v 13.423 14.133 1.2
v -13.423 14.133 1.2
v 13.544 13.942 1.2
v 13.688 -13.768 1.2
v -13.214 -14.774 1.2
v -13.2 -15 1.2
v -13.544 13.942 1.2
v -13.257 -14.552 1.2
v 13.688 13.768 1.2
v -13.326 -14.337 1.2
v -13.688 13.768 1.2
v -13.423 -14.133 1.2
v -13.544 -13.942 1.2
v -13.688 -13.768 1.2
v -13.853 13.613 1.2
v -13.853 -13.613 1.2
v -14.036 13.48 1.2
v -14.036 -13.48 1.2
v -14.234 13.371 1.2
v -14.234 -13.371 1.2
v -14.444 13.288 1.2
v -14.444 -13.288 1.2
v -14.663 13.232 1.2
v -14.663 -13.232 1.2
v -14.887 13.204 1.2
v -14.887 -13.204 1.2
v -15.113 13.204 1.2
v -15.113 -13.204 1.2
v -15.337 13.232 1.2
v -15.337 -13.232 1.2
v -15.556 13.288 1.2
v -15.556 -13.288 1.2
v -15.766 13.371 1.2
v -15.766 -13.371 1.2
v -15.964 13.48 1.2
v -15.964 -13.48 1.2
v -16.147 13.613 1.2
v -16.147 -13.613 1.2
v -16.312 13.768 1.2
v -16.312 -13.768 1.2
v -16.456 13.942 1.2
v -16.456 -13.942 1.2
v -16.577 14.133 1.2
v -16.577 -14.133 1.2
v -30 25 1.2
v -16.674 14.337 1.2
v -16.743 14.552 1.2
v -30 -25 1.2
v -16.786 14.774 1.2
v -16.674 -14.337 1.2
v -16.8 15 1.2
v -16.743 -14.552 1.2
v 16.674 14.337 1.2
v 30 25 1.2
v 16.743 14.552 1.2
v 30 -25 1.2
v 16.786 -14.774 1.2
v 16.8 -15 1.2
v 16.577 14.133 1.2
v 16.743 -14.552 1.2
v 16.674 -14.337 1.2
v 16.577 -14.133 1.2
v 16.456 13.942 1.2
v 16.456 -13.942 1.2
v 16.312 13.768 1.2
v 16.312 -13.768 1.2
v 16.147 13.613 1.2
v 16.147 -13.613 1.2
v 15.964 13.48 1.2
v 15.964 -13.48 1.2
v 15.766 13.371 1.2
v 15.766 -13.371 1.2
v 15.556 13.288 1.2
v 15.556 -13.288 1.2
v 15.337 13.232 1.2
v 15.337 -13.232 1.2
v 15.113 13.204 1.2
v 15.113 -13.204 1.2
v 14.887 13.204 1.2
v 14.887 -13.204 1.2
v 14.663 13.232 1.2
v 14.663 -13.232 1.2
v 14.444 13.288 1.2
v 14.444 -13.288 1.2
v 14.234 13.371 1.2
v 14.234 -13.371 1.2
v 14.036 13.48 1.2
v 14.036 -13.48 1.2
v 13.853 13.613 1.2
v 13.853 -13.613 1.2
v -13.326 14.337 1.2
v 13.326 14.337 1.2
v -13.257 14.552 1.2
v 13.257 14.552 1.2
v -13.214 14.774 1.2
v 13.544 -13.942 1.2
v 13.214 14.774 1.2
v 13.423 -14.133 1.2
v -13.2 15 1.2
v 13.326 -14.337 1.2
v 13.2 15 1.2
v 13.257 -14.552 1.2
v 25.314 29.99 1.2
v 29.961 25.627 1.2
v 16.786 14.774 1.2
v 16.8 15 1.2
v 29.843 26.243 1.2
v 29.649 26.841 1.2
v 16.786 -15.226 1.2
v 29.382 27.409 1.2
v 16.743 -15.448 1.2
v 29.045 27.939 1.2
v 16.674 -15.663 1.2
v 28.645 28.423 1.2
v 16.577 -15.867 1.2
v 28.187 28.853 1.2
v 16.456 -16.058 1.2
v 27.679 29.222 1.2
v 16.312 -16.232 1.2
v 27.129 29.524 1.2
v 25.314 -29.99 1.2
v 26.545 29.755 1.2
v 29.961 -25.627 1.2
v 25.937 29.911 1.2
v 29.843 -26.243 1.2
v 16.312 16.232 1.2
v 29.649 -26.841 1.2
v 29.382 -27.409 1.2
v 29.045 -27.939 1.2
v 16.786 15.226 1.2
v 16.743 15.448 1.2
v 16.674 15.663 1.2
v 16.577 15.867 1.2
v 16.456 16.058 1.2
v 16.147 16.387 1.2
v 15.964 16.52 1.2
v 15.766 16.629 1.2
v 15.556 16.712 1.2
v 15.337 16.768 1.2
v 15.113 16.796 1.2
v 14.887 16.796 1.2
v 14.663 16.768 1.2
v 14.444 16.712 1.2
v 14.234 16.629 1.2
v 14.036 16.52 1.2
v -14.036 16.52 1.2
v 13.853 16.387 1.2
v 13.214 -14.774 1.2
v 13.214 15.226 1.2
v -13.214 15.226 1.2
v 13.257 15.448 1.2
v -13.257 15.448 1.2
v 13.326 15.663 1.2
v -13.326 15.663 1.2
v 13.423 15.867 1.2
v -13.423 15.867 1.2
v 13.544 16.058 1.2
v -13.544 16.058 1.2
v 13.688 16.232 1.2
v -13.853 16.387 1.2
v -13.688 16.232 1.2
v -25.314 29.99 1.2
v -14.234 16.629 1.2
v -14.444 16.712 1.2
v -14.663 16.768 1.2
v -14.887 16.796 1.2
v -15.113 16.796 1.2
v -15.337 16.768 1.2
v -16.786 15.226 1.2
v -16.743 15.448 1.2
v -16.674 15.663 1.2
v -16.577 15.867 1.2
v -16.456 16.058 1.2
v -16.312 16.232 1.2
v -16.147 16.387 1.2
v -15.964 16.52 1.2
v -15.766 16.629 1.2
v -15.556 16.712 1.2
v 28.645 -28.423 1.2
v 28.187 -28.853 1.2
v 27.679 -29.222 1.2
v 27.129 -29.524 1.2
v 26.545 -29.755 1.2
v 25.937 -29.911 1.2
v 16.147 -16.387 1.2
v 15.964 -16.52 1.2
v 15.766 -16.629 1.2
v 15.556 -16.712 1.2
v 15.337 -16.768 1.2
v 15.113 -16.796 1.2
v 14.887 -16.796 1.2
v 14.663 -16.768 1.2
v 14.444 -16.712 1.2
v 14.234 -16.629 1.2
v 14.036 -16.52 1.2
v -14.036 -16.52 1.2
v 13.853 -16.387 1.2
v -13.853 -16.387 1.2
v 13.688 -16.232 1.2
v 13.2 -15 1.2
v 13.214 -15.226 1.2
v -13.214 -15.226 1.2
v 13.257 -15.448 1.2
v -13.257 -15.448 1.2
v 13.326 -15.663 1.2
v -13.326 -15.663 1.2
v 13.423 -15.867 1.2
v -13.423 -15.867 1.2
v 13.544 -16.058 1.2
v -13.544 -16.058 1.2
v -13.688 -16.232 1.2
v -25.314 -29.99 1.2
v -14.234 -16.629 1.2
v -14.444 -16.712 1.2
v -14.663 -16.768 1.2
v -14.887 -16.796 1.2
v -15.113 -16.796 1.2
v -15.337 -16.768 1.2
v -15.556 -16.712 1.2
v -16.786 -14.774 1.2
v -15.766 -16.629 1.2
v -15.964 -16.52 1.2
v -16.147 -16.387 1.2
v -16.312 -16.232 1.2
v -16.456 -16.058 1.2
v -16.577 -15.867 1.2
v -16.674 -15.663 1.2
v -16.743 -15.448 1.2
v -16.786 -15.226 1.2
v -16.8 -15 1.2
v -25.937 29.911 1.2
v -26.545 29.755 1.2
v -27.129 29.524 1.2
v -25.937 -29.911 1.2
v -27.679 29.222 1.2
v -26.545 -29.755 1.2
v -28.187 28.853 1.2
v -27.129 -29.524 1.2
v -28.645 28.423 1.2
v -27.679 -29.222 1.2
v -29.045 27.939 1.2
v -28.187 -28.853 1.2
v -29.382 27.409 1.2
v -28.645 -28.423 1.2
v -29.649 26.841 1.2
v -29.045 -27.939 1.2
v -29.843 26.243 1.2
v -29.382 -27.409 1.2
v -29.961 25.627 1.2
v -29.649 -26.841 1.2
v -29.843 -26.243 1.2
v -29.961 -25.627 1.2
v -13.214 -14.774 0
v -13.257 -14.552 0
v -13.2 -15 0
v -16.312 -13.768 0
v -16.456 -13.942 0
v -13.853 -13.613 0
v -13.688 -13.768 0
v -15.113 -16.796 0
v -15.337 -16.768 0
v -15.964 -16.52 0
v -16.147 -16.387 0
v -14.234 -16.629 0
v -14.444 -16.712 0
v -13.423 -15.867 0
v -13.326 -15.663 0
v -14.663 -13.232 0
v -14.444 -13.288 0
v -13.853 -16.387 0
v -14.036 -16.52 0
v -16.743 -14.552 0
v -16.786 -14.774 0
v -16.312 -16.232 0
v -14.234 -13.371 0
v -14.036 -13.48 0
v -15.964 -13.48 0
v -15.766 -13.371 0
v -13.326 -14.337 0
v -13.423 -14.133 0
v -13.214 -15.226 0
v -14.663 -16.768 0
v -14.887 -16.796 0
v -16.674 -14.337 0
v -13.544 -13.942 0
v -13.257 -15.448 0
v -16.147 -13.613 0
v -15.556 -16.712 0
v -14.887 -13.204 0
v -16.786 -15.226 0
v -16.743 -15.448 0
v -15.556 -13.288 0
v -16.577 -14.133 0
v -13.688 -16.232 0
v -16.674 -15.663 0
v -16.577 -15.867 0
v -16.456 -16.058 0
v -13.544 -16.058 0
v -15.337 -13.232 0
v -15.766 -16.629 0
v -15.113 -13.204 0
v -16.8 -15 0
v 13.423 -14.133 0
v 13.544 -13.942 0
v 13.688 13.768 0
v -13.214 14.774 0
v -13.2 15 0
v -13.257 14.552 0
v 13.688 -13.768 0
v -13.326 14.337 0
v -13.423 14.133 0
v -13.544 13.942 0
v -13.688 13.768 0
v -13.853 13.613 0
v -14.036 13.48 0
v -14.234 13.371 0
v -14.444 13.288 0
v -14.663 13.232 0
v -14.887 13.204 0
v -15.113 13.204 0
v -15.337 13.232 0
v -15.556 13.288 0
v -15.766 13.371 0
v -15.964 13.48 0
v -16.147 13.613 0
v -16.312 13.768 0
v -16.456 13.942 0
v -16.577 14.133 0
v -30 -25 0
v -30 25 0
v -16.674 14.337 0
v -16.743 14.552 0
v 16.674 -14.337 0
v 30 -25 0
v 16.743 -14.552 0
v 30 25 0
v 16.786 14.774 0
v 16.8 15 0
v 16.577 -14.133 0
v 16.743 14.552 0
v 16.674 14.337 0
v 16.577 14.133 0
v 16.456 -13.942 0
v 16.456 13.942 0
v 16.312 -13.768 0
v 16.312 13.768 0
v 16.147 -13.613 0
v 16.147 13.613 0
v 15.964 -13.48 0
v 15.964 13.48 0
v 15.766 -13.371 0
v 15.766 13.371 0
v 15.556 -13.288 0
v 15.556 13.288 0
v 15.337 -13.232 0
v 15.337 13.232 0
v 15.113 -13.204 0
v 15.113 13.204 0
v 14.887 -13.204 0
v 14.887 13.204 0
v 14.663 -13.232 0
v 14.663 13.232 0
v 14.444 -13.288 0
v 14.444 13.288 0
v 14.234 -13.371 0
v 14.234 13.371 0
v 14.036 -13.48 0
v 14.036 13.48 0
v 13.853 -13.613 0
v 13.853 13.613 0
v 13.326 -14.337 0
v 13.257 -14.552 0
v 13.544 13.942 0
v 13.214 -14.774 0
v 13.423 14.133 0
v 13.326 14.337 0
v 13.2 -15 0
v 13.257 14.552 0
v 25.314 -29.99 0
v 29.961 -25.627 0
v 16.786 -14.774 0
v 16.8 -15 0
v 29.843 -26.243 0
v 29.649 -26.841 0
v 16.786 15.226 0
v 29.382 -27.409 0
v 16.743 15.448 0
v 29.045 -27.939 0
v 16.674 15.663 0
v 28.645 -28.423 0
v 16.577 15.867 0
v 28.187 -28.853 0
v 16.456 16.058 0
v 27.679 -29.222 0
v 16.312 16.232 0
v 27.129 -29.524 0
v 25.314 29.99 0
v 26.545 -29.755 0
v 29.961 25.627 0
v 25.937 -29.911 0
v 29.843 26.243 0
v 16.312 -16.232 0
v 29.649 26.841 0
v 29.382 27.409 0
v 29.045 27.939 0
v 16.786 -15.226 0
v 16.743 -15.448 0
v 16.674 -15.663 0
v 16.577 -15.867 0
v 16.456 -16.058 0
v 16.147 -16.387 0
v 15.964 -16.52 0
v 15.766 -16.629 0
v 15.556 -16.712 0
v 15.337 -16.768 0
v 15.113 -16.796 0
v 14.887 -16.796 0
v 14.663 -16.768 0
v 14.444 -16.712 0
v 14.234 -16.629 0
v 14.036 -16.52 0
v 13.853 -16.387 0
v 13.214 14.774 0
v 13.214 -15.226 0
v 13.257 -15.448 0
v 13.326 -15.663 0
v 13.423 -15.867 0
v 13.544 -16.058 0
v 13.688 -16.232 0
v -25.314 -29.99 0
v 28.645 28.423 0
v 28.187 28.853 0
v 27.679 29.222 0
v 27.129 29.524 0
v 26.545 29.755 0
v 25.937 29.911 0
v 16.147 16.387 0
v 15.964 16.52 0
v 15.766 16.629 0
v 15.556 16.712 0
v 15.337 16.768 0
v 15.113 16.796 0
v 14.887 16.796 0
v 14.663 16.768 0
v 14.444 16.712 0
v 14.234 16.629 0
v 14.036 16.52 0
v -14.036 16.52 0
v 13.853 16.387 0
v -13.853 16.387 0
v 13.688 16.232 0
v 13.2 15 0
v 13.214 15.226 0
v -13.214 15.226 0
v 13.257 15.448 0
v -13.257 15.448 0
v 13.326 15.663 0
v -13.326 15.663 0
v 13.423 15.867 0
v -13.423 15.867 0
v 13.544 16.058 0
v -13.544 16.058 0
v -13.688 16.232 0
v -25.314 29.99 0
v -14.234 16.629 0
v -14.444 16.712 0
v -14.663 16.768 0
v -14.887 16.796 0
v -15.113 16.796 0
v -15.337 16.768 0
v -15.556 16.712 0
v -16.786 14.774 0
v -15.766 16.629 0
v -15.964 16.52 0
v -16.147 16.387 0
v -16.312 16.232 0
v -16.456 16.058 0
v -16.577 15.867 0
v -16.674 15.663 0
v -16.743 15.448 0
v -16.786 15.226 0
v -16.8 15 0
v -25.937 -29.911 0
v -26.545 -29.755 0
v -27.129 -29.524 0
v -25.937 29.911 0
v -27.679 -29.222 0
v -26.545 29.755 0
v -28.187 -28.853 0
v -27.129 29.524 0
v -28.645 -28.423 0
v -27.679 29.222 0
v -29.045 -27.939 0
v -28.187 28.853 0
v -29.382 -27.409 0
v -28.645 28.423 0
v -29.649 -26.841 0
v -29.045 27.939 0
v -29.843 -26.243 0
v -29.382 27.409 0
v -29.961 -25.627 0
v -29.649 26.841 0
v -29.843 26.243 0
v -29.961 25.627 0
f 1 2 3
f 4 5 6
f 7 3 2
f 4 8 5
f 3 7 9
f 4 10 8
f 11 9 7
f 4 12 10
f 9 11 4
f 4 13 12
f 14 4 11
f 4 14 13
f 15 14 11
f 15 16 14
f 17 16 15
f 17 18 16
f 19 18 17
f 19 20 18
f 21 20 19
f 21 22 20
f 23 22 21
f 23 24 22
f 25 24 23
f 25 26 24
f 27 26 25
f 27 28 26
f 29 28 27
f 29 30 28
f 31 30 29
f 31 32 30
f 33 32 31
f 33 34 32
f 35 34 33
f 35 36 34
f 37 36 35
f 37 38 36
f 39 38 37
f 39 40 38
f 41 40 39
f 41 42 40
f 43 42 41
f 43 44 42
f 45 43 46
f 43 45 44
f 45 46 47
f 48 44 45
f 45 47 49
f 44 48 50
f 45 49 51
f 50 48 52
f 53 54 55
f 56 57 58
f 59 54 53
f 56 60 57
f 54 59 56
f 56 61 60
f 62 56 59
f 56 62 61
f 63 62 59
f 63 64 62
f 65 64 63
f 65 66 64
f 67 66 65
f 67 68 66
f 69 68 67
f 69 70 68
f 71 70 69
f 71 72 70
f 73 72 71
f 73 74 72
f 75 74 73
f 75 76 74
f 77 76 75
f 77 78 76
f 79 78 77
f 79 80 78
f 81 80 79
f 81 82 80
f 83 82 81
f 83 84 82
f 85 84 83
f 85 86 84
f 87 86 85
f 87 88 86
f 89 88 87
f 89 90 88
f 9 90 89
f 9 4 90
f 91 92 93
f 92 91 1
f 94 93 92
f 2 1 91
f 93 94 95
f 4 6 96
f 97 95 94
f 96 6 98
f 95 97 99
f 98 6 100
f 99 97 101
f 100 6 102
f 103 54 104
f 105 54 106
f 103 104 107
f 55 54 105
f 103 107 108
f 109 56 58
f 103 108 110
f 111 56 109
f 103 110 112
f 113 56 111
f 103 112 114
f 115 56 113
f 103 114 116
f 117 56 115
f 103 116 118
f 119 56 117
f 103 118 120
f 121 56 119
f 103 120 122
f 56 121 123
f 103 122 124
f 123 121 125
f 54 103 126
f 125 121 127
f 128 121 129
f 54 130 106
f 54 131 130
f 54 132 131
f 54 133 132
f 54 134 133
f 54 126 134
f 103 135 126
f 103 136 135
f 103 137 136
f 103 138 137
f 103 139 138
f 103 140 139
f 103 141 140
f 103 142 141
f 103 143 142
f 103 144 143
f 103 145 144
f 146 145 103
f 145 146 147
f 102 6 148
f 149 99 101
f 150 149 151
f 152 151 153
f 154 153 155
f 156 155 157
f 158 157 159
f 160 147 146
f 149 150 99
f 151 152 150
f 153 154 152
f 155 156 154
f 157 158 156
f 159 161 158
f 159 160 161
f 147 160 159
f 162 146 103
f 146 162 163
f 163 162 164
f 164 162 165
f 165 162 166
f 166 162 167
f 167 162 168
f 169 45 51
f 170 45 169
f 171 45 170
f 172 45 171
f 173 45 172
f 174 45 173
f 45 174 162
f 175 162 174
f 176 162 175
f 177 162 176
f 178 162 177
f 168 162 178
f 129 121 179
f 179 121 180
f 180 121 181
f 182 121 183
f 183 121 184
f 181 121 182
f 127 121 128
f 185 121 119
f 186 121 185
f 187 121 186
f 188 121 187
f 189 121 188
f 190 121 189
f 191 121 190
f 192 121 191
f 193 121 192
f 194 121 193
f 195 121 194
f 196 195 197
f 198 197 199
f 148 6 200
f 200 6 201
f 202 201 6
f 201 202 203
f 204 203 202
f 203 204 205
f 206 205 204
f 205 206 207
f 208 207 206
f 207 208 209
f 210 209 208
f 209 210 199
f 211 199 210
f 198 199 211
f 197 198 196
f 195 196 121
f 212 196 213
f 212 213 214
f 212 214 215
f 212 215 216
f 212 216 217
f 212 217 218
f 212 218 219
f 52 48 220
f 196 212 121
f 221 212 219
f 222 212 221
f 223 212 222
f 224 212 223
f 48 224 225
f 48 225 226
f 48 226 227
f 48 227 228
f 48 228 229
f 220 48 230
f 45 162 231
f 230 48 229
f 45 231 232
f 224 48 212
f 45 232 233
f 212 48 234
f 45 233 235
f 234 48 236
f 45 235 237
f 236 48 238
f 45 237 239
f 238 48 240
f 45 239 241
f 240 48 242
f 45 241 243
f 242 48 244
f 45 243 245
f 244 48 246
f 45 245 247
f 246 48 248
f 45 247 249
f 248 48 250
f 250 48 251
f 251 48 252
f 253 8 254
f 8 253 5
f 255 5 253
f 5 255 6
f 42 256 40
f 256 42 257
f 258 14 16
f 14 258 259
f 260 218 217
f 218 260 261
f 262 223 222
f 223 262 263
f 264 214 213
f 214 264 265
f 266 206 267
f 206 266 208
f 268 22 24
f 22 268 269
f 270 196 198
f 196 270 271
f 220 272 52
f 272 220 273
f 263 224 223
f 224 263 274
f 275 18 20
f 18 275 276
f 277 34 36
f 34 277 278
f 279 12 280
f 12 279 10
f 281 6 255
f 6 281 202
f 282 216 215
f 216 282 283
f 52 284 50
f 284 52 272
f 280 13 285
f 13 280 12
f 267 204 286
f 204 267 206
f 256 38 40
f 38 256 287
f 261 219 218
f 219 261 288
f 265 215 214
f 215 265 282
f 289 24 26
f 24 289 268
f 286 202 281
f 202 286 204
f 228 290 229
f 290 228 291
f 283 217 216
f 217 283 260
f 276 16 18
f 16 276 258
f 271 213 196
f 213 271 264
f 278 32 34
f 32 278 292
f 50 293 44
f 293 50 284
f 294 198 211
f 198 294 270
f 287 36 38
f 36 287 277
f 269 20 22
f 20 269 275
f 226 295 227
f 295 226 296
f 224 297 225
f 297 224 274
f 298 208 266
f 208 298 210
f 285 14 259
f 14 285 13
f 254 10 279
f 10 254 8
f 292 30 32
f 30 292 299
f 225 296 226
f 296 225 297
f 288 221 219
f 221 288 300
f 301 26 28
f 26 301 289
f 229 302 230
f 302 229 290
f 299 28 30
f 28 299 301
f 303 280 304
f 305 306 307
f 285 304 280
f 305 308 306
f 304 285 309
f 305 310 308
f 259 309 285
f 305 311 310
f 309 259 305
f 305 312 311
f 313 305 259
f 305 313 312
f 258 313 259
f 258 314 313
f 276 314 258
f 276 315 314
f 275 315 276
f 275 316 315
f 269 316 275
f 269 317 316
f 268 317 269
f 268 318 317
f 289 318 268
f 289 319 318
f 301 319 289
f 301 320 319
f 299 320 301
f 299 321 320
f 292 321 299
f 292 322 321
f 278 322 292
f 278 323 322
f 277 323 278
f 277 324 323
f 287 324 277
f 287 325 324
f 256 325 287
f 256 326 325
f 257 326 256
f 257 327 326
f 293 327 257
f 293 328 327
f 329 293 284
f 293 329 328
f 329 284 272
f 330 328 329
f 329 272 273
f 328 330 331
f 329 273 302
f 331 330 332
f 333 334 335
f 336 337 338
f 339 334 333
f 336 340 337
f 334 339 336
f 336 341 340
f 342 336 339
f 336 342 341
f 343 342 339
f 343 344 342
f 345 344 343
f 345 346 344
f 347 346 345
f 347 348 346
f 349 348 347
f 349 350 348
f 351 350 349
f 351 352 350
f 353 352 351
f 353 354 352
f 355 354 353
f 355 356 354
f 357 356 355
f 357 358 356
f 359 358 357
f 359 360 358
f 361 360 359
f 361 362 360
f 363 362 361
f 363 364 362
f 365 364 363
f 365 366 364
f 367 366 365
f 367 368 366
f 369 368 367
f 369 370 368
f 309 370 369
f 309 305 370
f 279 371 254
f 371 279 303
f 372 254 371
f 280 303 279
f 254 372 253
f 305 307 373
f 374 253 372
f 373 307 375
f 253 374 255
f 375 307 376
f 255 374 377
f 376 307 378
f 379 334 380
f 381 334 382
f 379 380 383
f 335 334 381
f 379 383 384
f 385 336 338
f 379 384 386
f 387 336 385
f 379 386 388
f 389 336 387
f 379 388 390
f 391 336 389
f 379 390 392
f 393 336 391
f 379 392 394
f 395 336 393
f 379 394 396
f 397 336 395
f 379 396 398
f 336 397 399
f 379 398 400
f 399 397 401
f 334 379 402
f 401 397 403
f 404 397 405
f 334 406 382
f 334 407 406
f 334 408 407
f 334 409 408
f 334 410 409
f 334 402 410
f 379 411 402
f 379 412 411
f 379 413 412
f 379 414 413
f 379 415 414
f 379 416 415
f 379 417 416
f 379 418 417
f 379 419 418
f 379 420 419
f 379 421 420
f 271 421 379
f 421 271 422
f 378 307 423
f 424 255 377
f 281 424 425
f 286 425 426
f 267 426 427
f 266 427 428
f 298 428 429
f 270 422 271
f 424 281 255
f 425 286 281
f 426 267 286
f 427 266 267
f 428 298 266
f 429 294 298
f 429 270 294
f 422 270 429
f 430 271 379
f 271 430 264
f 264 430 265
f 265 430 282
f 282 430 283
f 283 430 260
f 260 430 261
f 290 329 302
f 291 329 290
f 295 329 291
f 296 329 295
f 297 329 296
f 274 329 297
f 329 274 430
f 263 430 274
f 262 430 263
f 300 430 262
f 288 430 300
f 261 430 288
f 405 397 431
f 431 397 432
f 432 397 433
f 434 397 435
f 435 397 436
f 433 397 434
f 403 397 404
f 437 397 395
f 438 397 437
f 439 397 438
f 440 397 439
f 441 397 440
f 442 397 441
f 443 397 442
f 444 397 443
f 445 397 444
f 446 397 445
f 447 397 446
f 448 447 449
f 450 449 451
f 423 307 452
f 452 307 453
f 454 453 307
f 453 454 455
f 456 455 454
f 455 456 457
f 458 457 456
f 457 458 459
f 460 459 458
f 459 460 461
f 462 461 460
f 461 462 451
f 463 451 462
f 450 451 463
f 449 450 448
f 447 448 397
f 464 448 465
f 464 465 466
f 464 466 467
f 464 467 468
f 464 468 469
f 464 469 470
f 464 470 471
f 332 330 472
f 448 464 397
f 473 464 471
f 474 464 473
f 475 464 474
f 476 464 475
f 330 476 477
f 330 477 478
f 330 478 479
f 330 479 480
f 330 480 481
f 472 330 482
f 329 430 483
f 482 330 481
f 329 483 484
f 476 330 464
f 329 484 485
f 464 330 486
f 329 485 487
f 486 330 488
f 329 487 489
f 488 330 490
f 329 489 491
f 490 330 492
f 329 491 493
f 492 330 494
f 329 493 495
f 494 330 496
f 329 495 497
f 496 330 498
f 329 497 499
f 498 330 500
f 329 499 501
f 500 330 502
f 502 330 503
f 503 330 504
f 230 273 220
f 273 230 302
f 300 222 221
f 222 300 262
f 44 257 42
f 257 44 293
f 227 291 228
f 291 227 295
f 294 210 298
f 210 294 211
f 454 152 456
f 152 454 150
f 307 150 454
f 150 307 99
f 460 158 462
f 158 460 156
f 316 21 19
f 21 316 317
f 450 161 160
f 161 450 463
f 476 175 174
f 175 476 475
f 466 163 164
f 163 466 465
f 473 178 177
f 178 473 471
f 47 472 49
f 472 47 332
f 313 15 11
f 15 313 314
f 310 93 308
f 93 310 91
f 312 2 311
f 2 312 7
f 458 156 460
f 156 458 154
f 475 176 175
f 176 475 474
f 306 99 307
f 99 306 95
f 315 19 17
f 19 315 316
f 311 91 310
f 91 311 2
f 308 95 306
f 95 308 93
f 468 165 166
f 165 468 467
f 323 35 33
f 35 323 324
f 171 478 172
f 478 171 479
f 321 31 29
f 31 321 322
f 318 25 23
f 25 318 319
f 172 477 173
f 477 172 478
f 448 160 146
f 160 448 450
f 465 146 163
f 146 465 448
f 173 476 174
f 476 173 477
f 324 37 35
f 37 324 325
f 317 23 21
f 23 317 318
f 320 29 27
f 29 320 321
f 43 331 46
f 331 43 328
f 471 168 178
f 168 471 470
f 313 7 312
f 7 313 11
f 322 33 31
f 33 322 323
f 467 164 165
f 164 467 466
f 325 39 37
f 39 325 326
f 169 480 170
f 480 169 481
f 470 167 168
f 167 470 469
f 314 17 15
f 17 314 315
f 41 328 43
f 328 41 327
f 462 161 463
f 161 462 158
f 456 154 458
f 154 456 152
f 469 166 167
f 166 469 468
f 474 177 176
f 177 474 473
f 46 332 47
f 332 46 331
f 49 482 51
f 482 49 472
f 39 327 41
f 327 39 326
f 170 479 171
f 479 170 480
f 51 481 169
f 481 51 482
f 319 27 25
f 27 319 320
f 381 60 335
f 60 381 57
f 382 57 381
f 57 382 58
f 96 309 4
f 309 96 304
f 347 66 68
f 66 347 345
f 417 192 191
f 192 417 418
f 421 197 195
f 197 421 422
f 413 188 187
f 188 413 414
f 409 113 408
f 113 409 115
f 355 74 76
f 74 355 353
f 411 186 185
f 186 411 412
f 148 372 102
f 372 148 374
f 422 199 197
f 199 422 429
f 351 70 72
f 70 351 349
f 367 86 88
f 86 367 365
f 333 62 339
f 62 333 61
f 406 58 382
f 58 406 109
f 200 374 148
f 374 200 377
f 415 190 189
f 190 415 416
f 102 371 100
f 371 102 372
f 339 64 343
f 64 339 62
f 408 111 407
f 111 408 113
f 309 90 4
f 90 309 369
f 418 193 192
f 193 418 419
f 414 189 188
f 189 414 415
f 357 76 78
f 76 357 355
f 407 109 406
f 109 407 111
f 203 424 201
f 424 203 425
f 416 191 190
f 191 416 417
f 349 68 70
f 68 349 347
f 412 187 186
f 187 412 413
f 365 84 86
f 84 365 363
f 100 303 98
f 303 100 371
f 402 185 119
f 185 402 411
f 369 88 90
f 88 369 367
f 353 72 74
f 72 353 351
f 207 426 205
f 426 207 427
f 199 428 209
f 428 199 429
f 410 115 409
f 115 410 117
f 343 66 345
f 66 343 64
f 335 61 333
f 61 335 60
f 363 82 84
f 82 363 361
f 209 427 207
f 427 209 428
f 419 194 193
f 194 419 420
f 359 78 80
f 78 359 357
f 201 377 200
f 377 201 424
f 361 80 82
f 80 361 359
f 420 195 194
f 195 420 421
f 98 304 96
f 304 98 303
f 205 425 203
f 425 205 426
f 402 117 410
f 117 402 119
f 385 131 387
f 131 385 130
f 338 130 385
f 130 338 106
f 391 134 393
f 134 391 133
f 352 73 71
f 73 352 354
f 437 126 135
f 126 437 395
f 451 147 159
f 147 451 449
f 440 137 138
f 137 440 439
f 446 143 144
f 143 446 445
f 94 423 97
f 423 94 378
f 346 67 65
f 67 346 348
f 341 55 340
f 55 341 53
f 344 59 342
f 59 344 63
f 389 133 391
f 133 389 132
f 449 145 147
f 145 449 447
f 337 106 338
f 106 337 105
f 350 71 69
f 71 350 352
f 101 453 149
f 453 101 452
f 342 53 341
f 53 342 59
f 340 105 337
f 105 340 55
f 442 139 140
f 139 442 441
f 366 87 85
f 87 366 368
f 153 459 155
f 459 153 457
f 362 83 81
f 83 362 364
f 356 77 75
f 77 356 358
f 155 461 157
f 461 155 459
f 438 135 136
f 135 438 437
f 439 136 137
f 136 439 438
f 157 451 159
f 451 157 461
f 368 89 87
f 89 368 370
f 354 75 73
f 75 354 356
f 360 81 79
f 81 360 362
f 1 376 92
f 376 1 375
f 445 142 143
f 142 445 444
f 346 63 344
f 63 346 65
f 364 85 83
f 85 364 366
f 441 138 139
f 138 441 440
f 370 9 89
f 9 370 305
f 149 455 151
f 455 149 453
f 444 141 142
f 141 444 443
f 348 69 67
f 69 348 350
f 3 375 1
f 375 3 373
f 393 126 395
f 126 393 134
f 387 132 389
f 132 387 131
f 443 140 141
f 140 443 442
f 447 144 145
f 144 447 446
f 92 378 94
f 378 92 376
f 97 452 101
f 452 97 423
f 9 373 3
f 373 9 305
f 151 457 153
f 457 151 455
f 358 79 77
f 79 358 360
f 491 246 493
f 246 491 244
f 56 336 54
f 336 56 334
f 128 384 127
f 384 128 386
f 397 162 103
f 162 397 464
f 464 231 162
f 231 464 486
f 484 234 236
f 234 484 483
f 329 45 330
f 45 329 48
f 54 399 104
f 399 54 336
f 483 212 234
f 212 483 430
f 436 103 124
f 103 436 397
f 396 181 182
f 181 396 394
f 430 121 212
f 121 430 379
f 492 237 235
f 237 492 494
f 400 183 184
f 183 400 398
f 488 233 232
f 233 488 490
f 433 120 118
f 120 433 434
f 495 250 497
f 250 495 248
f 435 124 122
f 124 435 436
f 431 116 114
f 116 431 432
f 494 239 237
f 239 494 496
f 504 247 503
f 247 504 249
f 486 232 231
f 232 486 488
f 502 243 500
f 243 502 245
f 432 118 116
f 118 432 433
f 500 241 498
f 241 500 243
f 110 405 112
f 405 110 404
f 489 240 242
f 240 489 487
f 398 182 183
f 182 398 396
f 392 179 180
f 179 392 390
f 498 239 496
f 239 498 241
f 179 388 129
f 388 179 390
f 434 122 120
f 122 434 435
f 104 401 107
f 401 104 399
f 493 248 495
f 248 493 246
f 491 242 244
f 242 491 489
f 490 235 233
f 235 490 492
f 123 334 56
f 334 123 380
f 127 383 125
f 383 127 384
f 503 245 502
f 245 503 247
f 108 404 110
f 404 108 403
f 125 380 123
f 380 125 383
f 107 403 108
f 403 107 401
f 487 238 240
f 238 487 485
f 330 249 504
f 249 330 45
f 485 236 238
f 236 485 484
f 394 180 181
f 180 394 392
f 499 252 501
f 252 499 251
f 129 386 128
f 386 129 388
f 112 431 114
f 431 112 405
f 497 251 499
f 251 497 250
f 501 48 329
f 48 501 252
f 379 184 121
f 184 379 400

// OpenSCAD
$fn = 50;


difference() {
	union() {
		hull() {
			translate(v = [-25.0000000000, 25.0000000000, 0]) {
				cylinder(h = 60, r = 5);
			}
			translate(v = [25.0000000000, 25.0000000000, 0]) {
				cylinder(h = 60, r = 5);
			}
			translate(v = [-25.0000000000, -25.0000000000, 0]) {
				cylinder(h = 60, r = 5);
			}
			translate(v = [25.0000000000, -25.0000000000, 0]) {
				cylinder(h = 60, r = 5);
			}
		}
	}
	union() {
		translate(v = [0, 0, 1.2000000000]) {
			hull() {
				translate(v = [-25.0000000000, 25.0000000000, 0]) {
					cylinder(h = 58.8000000000, r = 3.8000000000);
				}
				translate(v = [25.0000000000, 25.0000000000, 0]) {
					cylinder(h = 58.8000000000, r = 3.8000000000);
				}
				translate(v = [-25.0000000000, -25.0000000000, 0]) {
					cylinder(h = 58.8000000000, r = 3.8000000000);
				}
				translate(v = [25.0000000000, -25.0000000000, 0]) {
					cylinder(h = 58.8000000000, r = 3.8000000000);
				}
			}
		}
		#translate(v = [-15.0000000000, -15.0000000000, 0]) {
			cylinder(h = 1.2000000000, r = 1.8000000000);
		}
		#translate(v = [-15.0000000000, 15.0000000000, 0]) {
			cylinder(h = 1.2000000000, r = 1.8000000000);
		}
		#translate(v = [15.0000000000, -15.0000000000, 0]) {
			cylinder(h = 1.2000000000, r = 1.8000000000);
		}
		#translate(v = [15.0000000000, 15.0000000000, 0]) {
			cylinder(h = 1.2000000000, r = 1.8000000000);
		}
		translate(v = [-250.0000000000, -250.0000000000, 1.2000000000]) {
			cube(size = [500, 500, 500]);
		}
		translate(v = [-250.0000000000, -250.0000000000, 1.2000000000]) {
			cube(size = [500, 500, 500]);
		}
		translate(v = [-250.0000000000, -250.0000000000, 1.2000000000]) {
			cube(size = [500, 500, 500]);
		}
	}
}
